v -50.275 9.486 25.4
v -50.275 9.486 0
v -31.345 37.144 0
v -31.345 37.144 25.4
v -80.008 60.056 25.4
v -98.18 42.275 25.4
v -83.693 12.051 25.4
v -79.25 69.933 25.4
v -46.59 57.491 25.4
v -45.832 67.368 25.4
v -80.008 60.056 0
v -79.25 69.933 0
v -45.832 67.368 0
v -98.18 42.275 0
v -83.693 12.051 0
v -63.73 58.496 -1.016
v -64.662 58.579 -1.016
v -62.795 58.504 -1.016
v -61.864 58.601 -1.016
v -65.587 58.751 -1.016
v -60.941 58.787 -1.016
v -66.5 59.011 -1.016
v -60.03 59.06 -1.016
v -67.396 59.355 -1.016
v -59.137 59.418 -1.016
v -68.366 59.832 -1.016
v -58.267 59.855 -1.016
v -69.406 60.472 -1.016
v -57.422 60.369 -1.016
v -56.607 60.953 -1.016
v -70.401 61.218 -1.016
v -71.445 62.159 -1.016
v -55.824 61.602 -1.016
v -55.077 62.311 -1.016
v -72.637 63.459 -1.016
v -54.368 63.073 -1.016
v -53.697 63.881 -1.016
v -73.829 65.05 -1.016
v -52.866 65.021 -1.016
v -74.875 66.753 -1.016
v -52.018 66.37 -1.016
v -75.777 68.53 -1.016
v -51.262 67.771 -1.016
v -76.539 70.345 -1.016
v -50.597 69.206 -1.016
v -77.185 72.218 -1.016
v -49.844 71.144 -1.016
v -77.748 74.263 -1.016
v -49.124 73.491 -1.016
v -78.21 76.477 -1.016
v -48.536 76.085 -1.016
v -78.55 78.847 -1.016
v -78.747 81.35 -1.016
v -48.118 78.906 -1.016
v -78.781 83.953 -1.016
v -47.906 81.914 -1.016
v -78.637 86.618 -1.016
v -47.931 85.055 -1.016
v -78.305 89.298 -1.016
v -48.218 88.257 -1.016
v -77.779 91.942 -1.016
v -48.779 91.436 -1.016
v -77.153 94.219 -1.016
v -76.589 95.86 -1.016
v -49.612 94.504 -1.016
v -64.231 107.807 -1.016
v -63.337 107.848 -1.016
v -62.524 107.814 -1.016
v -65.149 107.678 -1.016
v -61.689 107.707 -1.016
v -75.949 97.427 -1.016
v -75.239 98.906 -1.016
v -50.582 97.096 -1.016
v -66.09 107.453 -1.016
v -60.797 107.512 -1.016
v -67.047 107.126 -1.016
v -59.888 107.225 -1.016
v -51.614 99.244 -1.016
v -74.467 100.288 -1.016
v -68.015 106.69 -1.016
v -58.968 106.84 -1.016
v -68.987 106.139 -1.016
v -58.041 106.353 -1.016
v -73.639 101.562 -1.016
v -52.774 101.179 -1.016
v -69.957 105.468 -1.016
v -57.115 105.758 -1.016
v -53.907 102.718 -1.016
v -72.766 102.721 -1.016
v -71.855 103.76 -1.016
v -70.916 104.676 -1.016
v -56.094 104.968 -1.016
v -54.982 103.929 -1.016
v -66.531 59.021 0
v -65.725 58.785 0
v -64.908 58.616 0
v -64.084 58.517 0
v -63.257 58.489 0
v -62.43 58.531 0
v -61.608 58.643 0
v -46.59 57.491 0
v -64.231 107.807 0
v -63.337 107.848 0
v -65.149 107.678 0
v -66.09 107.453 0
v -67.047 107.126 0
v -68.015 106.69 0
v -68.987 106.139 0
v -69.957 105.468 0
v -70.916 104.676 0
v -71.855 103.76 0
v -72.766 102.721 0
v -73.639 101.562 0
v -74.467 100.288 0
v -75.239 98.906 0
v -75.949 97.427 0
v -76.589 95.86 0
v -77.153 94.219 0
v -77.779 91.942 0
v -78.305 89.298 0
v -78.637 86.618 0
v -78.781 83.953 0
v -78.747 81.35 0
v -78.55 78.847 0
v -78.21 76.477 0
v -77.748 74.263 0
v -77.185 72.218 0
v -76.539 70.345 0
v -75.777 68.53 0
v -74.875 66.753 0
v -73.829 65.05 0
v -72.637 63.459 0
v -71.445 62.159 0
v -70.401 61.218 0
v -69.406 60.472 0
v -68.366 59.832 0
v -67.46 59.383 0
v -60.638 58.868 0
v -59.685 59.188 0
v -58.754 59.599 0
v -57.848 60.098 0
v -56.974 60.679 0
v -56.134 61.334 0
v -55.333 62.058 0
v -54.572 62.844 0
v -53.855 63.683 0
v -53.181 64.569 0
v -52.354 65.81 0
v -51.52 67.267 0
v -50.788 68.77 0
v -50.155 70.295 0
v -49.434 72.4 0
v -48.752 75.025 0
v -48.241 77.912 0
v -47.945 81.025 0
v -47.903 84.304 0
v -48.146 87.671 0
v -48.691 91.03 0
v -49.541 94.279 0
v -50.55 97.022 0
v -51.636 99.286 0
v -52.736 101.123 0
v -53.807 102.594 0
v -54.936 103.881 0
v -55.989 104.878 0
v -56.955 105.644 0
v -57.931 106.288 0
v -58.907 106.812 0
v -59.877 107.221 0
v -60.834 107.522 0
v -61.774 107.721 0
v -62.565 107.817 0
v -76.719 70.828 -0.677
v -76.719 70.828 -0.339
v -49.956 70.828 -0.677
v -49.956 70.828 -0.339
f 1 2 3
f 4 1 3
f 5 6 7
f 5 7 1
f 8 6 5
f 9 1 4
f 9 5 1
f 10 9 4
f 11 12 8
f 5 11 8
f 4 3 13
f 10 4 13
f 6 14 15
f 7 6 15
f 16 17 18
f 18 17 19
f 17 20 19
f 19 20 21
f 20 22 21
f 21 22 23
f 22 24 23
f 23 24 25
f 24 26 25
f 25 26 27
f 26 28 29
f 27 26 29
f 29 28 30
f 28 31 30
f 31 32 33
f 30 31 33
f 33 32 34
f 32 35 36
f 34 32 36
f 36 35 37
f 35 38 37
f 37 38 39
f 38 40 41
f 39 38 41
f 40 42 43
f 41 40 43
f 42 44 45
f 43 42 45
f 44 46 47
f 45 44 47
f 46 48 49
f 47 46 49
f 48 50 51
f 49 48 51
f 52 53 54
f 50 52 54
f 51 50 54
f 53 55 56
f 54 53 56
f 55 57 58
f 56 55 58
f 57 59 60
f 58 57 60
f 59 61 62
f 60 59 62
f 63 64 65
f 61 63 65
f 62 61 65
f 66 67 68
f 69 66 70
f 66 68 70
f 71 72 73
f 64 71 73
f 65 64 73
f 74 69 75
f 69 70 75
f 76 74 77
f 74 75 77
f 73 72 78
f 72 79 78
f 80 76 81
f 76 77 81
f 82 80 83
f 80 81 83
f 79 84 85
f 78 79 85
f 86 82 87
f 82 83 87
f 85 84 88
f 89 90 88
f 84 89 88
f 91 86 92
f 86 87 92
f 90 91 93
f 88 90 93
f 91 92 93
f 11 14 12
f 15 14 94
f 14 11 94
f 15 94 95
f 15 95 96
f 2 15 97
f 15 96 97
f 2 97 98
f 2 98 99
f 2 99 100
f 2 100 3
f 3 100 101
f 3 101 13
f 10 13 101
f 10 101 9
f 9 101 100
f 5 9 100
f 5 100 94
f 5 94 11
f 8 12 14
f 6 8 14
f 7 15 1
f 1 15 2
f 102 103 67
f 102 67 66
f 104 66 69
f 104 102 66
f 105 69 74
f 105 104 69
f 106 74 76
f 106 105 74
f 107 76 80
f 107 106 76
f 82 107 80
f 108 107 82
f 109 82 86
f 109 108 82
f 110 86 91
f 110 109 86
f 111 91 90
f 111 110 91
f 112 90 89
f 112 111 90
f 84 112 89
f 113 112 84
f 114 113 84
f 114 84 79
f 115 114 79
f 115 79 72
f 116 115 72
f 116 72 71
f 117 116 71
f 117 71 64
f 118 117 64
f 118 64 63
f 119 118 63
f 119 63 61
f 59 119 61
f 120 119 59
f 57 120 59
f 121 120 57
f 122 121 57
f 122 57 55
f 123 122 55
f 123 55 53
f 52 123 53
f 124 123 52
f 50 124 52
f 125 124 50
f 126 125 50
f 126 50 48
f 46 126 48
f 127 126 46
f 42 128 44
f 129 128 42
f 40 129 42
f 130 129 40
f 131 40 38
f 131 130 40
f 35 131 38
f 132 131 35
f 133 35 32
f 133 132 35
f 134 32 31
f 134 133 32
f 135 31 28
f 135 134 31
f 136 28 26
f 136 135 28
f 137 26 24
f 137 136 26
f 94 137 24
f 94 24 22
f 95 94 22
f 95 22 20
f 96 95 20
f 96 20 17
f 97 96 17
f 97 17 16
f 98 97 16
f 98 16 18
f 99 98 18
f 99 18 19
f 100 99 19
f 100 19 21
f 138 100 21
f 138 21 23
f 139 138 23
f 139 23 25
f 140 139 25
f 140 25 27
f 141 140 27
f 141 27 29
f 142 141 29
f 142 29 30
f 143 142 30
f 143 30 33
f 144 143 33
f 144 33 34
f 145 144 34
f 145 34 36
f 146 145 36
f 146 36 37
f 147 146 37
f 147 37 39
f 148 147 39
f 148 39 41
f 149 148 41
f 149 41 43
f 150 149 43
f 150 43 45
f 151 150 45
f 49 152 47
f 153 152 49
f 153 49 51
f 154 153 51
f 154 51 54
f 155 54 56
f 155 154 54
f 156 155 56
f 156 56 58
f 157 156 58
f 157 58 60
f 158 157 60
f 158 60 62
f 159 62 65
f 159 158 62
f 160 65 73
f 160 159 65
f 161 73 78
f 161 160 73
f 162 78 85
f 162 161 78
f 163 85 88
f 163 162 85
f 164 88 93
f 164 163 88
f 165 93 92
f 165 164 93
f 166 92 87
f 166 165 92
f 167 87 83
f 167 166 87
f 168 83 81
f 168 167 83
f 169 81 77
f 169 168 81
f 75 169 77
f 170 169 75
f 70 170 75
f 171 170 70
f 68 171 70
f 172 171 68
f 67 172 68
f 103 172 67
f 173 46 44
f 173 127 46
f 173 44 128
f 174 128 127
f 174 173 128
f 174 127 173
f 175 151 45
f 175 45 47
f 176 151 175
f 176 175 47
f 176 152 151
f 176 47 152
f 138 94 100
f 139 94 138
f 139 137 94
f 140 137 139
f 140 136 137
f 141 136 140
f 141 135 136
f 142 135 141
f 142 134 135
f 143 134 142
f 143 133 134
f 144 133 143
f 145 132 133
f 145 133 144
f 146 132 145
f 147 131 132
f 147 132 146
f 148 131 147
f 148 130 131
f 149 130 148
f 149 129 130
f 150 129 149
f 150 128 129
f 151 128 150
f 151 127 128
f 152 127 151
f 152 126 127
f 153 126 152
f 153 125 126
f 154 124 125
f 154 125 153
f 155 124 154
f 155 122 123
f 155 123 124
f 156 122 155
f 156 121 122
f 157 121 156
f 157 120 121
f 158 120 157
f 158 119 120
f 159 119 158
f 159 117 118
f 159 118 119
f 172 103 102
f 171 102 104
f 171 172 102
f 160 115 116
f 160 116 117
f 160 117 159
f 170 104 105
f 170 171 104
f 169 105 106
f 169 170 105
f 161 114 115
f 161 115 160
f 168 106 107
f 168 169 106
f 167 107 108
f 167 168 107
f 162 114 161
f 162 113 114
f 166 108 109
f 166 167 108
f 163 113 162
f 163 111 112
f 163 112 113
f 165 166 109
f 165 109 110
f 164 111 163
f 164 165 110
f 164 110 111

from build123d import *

# Parameters (mm, degrees)
F2_DEPTH = 25.4
F4_DEPTH = 9.906
F6_DEPTH = 1.016


# Not quite as in the source:
# - the program builds the solid bodies; features that only make, move or delete a surface that nothing else refers to are left out


with BuildPart() as f2:
    # F0 (on Top) → F2 (new body)
    with BuildSketch(Plane.XY):
        Polygon((-98.1804851865, 42.2748850128), (-83.6932088757, 12.0514331916), (-50.2752936531, 9.4860565979), (-31.3446547413, 37.1441318253), (-45.8319310522, 67.3675836465), (-79.2498462748, 69.9329602402), align=None)
    extrude(amount=F2_DEPTH)

    # F4 (cut): a face of the model
    f4_faces = [f2.faces().sort_by_distance(p)[0] for p in [
        (-62.5408886635, 68.6502719433, 12.7),
    ]]
    extrude(f4_faces, amount=-F4_DEPTH, mode=Mode.SUBTRACT)

    # F5 (on Top) → F6 (join)
    with BuildSketch(Plane.XY):
        with BuildLine():
            add(Edge.make_bspline(
                [(-63.3374005556, 107.8479960561), (-90.0996928702, 107.8479960561), (-76.7185467129, 70.8282925189), (-63.3374005556, 33.8085889816), (-49.9562543983, 70.8282925189), (-36.575108241, 107.8479960561), (-63.3374005556, 107.8479960561)],
                knots=[0, 0, 0, 2.0943951024, 2.0943951024, 4.1887902048, 4.1887902048, 6.2831853072, 6.2831853072, 6.2831853072], degree=2, weights=[1, 0.5, 1, 0.5, 1, 0.5, 1]))
        make_face()
    extrude(amount=-F6_DEPTH)


solid = f2.part
